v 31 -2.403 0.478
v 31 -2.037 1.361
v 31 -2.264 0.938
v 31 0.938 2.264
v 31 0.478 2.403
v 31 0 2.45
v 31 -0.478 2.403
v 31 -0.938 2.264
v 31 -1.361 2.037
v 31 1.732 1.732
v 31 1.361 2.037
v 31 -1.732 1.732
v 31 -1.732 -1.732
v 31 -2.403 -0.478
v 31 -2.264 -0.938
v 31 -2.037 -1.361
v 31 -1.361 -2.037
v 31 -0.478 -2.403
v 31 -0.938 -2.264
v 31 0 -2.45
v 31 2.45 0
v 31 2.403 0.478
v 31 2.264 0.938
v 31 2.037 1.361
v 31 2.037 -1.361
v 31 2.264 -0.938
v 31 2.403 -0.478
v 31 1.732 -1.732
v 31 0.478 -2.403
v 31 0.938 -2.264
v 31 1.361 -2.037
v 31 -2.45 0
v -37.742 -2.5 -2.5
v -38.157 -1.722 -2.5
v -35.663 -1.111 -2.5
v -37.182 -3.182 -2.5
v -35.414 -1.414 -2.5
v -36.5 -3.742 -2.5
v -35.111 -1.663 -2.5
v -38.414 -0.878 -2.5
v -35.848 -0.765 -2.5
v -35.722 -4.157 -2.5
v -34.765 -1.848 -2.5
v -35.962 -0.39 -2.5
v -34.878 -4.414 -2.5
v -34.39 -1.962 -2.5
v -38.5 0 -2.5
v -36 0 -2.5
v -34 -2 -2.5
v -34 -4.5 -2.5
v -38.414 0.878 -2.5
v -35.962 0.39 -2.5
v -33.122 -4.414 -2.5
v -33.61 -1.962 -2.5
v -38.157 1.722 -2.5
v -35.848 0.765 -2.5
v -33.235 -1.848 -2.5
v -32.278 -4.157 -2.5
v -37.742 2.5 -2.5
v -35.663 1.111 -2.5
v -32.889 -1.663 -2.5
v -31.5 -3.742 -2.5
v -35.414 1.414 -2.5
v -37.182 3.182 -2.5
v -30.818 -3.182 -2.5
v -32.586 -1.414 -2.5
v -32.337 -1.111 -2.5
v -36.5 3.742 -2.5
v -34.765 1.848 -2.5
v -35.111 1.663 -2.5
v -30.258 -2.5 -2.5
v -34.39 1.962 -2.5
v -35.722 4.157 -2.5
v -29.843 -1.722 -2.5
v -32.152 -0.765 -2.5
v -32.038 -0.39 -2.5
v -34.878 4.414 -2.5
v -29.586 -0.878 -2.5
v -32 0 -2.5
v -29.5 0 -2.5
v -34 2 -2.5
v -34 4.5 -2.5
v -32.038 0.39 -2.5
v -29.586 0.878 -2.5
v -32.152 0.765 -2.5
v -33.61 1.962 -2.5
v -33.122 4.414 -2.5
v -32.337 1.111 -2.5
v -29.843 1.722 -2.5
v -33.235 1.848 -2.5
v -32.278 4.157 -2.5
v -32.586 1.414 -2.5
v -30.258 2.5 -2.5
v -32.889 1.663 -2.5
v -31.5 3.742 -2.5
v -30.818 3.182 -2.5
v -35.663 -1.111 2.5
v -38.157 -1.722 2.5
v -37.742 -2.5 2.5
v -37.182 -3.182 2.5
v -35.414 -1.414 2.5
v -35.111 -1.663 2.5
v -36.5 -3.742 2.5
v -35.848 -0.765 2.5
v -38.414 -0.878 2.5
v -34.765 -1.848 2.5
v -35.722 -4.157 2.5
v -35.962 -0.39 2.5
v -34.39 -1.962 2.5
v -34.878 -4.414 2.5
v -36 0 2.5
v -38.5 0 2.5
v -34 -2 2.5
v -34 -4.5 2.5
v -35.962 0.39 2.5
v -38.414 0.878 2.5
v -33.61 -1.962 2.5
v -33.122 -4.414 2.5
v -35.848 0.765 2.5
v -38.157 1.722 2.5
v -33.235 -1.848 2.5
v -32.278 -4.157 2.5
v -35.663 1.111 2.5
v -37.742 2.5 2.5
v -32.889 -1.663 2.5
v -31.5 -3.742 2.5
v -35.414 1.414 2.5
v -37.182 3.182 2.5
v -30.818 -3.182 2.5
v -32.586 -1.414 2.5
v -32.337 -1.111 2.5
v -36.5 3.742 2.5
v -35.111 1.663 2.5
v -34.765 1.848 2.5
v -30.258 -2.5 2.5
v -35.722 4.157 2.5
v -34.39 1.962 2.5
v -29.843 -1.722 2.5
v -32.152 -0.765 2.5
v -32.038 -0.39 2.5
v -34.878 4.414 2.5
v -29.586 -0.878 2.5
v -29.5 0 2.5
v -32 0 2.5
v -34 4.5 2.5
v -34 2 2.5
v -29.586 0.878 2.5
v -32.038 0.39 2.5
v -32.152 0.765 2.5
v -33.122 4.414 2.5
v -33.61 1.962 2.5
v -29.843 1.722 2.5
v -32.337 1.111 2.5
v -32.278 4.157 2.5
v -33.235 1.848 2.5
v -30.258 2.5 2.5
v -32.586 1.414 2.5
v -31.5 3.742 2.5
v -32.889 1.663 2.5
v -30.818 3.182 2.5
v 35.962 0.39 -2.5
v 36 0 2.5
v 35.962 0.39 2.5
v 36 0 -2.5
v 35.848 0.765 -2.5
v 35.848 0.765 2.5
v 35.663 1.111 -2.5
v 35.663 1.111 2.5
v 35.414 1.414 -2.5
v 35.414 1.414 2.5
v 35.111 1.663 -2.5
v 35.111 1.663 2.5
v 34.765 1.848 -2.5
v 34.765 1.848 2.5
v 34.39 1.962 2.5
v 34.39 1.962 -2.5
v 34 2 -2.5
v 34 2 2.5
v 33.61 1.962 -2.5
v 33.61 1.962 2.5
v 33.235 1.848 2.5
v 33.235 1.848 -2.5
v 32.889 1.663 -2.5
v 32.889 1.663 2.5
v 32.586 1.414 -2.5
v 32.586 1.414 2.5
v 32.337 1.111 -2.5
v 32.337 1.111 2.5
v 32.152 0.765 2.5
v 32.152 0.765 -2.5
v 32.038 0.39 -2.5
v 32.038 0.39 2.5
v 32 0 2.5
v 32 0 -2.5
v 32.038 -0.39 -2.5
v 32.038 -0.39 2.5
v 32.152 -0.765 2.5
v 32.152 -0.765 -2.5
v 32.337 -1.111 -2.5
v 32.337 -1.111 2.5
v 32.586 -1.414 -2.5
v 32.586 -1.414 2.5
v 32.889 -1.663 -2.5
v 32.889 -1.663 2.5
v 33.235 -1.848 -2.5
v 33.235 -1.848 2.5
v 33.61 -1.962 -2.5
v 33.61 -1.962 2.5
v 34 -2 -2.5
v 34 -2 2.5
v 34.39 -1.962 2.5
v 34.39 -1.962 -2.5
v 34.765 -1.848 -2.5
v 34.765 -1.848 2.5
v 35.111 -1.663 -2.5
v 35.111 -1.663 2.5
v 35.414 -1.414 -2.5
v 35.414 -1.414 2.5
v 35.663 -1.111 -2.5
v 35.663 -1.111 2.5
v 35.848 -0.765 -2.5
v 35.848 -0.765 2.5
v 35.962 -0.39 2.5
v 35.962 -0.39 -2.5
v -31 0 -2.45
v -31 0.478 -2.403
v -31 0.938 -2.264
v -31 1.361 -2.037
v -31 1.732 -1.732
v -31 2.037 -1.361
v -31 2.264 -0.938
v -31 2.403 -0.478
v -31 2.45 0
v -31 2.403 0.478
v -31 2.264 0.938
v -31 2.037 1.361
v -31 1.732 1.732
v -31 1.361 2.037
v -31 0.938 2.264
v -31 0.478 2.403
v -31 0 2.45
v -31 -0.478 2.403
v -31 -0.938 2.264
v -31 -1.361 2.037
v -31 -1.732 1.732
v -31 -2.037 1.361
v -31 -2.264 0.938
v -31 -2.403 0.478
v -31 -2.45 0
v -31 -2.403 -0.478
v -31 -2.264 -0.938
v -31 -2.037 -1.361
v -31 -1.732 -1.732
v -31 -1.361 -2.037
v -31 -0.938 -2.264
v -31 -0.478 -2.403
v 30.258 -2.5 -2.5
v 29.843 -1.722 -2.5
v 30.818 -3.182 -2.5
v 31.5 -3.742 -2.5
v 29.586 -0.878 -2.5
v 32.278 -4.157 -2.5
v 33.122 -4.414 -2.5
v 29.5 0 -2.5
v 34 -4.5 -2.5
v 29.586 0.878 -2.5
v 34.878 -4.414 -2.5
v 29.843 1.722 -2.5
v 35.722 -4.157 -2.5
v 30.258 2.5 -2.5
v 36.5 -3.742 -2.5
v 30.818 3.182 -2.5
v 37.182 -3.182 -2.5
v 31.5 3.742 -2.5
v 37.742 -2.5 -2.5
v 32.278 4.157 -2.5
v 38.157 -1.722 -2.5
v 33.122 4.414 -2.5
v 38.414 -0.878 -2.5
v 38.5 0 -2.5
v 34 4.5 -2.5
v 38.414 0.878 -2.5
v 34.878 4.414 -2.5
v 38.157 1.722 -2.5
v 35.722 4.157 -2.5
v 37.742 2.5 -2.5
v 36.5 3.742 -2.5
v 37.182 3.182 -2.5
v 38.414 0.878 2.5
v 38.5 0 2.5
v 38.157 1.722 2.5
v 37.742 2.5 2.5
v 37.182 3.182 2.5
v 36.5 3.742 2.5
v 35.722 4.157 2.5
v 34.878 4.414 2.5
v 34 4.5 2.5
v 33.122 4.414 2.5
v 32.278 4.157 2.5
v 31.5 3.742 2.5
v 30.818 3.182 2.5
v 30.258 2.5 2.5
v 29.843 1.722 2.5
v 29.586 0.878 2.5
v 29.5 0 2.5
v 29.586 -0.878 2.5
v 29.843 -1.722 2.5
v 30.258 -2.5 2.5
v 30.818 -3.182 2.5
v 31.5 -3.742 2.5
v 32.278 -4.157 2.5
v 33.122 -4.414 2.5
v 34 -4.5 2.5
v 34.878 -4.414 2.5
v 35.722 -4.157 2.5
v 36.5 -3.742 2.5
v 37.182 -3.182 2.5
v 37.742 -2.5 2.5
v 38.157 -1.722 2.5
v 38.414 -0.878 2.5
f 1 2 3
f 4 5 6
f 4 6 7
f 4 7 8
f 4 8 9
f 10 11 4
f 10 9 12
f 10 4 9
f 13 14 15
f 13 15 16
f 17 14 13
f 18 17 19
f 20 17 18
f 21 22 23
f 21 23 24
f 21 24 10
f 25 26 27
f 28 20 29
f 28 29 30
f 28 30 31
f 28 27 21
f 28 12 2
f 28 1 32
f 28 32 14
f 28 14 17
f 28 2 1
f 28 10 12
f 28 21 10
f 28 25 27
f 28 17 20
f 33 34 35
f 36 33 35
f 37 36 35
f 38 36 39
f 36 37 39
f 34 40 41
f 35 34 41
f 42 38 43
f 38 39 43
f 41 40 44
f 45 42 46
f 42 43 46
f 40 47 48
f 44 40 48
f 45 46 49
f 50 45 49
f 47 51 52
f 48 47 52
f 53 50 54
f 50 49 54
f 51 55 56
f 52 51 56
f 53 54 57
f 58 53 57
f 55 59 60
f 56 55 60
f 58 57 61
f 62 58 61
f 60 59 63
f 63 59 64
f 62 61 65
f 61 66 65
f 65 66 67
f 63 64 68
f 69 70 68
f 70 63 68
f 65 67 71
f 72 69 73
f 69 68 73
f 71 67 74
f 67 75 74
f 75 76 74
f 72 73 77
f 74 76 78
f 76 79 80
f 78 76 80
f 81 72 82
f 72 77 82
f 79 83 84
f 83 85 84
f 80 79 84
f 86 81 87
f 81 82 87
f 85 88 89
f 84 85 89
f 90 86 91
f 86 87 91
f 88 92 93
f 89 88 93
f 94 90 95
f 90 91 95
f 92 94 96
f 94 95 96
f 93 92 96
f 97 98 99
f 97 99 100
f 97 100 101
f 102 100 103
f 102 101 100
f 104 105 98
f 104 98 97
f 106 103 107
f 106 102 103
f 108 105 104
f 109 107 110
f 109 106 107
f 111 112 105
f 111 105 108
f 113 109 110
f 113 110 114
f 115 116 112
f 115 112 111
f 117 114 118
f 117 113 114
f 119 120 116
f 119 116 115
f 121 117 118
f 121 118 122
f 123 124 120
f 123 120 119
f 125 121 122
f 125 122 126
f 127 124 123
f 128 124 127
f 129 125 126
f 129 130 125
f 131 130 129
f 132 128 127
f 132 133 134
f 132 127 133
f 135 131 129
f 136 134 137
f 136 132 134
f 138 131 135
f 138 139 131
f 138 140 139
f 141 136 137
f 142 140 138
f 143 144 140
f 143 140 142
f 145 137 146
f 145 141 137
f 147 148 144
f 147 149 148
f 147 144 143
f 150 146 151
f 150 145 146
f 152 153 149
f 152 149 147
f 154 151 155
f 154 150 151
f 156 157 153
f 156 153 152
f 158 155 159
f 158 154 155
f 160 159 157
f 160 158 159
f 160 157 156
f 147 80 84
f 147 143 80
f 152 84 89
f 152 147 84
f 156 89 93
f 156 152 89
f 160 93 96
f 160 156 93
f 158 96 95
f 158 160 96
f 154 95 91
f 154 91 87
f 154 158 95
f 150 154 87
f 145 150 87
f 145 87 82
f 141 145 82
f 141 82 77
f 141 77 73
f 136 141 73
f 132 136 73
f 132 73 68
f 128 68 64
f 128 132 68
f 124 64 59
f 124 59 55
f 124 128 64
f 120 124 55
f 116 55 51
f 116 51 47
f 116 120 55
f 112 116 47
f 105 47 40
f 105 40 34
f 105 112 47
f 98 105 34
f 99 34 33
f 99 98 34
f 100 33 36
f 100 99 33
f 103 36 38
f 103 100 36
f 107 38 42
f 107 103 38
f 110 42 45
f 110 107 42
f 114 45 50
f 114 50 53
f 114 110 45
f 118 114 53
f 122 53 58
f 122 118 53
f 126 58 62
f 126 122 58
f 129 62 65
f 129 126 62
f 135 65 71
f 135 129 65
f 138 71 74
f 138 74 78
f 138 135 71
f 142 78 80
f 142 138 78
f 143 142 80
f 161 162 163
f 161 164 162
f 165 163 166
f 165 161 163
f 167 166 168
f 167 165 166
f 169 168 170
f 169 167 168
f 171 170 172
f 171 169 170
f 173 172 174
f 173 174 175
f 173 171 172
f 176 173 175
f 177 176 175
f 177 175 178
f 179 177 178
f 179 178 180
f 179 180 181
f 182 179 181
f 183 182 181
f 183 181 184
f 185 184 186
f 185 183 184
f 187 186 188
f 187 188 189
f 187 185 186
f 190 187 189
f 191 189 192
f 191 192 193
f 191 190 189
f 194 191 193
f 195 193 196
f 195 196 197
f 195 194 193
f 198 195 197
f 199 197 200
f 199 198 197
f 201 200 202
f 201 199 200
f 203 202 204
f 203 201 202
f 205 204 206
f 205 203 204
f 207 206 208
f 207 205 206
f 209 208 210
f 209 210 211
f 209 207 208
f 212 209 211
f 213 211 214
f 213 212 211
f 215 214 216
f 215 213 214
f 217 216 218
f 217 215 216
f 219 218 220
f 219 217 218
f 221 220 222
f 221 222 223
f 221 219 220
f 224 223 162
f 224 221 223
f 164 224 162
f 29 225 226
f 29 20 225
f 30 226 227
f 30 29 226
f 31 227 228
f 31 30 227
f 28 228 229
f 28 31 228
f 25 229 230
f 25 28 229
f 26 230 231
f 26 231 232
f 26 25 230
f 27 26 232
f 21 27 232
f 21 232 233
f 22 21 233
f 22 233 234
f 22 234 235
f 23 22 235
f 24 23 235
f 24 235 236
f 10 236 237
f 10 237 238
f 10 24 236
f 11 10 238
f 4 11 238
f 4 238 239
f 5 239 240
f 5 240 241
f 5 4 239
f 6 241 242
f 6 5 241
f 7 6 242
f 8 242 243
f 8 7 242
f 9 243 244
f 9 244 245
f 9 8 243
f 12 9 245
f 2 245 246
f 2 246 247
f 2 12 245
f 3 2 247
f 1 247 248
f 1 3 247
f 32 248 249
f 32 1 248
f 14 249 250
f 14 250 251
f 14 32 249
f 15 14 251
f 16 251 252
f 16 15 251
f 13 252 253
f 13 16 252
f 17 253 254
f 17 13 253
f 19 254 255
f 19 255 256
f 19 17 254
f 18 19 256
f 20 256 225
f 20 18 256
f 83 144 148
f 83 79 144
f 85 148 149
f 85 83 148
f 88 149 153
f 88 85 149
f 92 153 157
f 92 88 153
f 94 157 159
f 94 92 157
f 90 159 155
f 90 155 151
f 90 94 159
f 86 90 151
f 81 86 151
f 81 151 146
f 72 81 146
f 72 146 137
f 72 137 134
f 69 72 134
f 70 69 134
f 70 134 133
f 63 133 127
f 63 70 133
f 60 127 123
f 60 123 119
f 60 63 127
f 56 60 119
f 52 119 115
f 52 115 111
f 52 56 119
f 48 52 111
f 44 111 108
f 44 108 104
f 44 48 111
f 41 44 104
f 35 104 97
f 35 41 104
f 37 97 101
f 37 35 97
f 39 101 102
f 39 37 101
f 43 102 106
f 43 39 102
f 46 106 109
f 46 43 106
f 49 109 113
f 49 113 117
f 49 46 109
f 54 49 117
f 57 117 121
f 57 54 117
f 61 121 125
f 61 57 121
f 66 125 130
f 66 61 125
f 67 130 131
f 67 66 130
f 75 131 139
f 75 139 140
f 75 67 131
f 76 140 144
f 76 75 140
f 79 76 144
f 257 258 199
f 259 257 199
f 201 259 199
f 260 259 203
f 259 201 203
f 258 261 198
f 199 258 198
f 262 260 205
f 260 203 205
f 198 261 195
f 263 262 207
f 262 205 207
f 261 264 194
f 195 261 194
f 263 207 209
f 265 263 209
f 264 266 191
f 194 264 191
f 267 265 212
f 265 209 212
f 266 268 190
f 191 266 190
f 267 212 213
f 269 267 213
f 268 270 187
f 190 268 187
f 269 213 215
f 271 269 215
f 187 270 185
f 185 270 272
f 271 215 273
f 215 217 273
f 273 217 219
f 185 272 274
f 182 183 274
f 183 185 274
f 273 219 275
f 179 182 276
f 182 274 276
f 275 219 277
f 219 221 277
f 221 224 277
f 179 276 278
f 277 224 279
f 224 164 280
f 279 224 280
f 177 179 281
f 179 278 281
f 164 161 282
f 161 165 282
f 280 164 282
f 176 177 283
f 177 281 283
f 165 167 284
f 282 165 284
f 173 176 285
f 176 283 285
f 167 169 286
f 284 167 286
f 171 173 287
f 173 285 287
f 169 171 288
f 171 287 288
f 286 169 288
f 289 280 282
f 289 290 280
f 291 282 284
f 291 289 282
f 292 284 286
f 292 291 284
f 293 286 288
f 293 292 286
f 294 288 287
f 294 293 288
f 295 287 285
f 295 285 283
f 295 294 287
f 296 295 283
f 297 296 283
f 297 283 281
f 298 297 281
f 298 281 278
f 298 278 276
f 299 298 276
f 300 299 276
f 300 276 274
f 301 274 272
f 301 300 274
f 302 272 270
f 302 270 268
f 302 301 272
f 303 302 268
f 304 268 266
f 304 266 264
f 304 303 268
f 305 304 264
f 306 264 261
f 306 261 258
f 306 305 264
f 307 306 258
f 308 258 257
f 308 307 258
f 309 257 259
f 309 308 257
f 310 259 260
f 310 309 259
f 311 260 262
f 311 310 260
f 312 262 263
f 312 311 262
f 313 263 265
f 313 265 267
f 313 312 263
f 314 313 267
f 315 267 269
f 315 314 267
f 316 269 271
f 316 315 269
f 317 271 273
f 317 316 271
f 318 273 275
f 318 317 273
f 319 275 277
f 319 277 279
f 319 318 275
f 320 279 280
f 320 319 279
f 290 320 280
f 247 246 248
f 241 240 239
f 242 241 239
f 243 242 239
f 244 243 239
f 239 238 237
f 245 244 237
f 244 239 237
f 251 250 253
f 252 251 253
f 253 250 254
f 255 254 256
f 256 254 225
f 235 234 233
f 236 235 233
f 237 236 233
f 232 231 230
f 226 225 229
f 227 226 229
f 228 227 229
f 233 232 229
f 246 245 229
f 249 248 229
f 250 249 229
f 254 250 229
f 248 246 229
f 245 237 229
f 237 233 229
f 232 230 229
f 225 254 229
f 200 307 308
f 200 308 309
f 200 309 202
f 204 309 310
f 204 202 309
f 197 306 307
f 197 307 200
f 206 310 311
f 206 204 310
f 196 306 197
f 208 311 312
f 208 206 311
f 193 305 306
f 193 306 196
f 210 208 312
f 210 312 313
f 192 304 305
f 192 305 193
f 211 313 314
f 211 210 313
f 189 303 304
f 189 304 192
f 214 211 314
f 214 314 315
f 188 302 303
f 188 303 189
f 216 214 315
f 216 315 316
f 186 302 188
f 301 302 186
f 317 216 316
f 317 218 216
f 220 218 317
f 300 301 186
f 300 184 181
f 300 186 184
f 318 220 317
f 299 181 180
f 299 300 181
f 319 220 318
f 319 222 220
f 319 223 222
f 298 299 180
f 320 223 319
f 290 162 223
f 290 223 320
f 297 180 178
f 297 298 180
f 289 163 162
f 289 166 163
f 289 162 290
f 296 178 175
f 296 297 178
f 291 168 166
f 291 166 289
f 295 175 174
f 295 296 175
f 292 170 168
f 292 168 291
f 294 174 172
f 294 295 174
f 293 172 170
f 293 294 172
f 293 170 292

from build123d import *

# Parameters (mm, degrees)
SKETCH_1_R        = 4.5
SKETCH_1_R_2      = 2
EXTRUDE_1_DEPTH   = 2.5
EXTRUDE_1_2_DEPTH = 2.5
SKETCH_2_R        = 2.45
EXTRUDE_2_DEPTH   = 31


with BuildPart() as part:
    # 草图1 → 凸台-拉伸1 (new, symmetric)
    with BuildSketch(Plane.XY):
        with Locations((34, 0)):
            Circle(SKETCH_1_R)
        with Locations((34, 0)):
            Circle(SKETCH_1_R_2, mode=Mode.SUBTRACT)
    extrude(amount=EXTRUDE_1_DEPTH, both=True)


with BuildPart() as body_2:
    # 草图1 → Extrude 1 2 (new, symmetric)
    with BuildSketch(Plane.XY):
        with Locations((-34, 0)):
            Circle(SKETCH_1_R)
        with Locations((-34, 0)):
            Circle(SKETCH_1_R_2, mode=Mode.SUBTRACT)
    extrude(amount=EXTRUDE_1_2_DEPTH, both=True)


with BuildPart() as body_3:
    # 草图2 → 凸台-拉伸2 (new, symmetric)
    with BuildSketch(Plane(origin=(0, 0, 0), x_dir=(0, 0, -1), z_dir=(1, 0, 0))):
        Circle(SKETCH_2_R)
    extrude(amount=EXTRUDE_2_DEPTH, both=True)


solid = Compound([part.part, body_2.part, body_3.part])
